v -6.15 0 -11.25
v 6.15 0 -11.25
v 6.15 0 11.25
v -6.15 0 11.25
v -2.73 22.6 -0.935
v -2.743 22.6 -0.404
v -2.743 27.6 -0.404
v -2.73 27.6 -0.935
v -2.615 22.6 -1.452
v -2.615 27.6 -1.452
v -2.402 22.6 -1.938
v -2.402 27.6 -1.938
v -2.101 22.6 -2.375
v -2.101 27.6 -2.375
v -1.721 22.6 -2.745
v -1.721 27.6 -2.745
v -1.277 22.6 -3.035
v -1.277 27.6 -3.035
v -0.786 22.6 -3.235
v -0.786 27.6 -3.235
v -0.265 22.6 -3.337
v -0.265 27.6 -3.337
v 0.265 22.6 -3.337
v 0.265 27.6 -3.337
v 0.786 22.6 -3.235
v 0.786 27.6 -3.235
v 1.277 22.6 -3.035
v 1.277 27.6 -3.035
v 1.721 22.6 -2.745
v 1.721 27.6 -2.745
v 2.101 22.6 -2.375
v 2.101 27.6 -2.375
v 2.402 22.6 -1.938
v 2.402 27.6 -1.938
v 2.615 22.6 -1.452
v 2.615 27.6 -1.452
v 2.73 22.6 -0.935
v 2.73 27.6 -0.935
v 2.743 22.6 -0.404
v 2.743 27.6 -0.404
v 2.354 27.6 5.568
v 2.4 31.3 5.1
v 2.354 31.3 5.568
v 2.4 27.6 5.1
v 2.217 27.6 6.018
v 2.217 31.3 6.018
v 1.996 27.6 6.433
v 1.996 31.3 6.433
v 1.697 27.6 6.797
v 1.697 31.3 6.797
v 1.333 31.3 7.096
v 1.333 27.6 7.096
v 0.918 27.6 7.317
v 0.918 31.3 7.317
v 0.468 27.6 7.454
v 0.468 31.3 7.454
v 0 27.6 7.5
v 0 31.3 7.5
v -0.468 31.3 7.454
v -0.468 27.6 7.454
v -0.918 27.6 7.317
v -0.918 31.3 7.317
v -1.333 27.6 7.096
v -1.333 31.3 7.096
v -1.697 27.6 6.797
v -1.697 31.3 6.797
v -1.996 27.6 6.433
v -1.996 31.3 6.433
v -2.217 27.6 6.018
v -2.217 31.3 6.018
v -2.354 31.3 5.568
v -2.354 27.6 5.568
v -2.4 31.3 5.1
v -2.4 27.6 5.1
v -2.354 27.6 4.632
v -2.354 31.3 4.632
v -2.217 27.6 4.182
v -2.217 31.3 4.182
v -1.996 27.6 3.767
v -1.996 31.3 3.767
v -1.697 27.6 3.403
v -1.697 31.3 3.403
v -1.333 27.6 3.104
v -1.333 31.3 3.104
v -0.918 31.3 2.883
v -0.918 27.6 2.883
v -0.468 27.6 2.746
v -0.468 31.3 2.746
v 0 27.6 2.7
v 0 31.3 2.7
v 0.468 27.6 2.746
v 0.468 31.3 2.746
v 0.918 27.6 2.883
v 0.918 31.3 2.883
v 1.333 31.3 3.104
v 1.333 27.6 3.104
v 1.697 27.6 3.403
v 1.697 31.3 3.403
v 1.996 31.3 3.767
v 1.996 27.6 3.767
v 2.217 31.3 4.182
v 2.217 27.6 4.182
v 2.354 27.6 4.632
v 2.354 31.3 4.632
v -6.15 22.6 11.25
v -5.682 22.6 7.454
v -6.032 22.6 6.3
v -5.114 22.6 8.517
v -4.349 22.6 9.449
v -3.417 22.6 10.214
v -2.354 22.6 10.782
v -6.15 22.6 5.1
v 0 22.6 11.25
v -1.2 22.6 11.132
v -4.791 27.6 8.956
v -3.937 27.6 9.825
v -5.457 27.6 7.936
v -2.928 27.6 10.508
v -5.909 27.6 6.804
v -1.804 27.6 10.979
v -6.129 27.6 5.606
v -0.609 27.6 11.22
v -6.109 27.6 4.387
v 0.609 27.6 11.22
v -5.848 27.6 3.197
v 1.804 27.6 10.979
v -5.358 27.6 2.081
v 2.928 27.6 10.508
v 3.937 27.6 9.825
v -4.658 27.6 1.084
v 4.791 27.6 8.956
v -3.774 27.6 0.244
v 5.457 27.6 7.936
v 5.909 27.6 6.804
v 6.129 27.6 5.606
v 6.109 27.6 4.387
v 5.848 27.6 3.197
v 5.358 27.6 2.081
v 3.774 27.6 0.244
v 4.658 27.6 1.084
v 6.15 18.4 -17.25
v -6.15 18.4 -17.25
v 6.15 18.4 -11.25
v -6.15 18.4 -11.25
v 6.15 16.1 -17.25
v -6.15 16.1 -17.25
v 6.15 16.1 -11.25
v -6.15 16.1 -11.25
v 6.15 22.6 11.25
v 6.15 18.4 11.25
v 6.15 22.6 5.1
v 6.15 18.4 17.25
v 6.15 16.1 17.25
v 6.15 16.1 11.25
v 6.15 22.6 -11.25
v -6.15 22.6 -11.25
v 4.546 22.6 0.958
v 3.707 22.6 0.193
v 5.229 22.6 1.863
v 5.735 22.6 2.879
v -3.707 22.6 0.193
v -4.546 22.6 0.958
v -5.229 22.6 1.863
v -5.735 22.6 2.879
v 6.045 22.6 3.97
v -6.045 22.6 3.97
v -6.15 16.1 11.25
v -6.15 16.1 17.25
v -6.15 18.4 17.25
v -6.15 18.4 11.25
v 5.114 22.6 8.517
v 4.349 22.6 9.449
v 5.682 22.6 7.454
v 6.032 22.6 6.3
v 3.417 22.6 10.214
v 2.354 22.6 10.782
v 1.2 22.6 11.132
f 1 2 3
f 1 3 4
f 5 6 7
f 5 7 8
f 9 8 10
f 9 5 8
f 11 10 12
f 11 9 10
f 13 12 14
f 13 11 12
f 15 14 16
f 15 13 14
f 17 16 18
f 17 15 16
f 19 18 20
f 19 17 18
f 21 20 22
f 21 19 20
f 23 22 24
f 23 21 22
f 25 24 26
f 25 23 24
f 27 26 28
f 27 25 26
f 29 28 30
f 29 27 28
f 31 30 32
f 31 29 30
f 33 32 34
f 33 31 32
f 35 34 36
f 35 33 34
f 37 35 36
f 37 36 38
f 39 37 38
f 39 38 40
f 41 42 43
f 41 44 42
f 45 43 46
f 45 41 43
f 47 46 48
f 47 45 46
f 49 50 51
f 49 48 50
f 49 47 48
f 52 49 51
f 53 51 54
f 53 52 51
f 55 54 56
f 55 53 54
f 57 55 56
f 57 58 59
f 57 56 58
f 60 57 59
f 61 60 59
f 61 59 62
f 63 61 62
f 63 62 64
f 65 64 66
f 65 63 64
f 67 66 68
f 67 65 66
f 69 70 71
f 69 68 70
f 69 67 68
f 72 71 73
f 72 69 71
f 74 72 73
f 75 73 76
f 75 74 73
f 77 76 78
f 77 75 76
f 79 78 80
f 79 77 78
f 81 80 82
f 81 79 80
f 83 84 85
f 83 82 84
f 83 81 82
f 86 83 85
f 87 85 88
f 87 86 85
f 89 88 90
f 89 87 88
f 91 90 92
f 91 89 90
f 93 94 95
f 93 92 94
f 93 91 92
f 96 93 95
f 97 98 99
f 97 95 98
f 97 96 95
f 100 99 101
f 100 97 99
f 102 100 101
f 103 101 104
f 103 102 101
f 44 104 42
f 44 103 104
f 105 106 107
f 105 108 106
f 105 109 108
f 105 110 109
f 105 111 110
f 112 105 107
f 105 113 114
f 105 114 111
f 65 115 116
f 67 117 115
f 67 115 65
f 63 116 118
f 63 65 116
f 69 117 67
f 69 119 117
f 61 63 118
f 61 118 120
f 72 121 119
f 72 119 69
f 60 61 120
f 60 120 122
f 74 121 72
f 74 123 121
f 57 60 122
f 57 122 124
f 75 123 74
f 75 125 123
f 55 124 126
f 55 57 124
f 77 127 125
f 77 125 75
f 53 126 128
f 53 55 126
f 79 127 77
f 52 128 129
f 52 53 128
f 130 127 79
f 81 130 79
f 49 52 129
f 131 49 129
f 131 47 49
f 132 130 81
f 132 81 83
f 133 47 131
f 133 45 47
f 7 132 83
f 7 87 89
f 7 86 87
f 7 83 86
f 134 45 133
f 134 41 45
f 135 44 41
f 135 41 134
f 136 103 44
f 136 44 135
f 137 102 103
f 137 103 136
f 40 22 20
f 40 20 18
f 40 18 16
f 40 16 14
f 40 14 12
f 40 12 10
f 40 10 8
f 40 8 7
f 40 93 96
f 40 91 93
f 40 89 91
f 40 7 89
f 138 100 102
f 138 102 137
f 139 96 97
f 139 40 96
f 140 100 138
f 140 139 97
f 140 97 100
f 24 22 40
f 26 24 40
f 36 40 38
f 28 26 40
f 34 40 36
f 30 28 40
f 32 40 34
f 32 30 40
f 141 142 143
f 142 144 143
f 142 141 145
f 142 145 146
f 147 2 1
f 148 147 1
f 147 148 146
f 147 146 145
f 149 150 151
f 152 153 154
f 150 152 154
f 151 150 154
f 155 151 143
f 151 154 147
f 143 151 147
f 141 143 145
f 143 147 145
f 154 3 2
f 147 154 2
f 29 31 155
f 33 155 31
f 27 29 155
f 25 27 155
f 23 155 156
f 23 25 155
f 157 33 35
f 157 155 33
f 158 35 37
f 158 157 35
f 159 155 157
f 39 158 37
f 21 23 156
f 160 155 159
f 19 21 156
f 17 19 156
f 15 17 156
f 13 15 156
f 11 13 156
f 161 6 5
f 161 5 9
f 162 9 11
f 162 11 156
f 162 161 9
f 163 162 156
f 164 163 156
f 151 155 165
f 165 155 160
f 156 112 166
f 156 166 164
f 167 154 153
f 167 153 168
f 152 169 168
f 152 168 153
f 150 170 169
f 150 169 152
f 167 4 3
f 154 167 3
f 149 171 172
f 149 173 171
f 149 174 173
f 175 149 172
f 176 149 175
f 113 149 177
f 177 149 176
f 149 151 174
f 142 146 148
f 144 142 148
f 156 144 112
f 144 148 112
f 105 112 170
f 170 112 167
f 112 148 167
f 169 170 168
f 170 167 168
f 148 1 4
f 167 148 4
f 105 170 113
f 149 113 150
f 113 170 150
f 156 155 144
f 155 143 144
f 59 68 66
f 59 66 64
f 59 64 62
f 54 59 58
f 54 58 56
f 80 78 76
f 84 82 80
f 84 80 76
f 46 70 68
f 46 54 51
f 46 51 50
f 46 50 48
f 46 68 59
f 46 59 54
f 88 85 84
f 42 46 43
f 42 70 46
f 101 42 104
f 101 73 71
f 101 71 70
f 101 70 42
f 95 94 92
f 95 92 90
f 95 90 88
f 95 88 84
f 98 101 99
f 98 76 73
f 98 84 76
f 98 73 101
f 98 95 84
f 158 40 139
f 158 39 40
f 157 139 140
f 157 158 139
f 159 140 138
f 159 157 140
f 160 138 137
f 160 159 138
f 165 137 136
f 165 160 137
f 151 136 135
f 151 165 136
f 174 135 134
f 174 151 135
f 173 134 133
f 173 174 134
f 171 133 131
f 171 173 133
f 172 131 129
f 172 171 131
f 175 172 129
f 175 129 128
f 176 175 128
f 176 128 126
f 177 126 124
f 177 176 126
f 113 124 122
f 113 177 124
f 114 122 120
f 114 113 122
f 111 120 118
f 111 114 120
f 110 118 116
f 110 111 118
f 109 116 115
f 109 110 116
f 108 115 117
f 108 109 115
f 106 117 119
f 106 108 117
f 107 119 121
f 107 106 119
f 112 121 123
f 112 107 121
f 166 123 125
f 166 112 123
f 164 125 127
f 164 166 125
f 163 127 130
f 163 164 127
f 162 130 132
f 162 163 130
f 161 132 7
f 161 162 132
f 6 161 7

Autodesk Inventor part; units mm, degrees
ref_plane "YZ Plane" through (0, 0, 0) normal (1, 0, 0) x (0, 1, 0)
ref_plane "XZ Plane" through (0, 0, 0) normal (0, 1, 0) x (-1, 0, 0)
ref_plane "XY Plane" through (0, 0, 0) normal (0, 0, 1) x (1, 0, 0)
sketch "Esquisse1" plane through (0, 0, 0) normal (0, 1, 0) x (-1, 0, 0)
  line L0 (6.15, 11.25) -> (-6.15, 11.25)
  line L1 (-6.15, 11.25) -> (-6.15, -11.25)
  line L2 (-6.15, -11.25) -> (6.15, -11.25)
  line L3 (6.15, -11.25) -> (6.15, 11.25)
  line L4 (6.15, 11.25) -> (-6.15, -11.25)
  line L5 (-6.15, 11.25) -> (6.15, -11.25)
  point P0 (0, 0)
  point P1 (0, 0)
  point P2 (0, 0)
  dimension "d0" = 22.5
  dimension "d1" = 12.3
extrude "Extrusion1" add sketch "Esquisse1" along normal blind 22.6
sketch "Esquisse2" plane through (-6.15, 0, 11.25) normal (0, 0, 1) x (1, 0, 0)
  line L0 (0, 0) -> (0, 22.6) projected
  line L1 (12.3, 0) -> (12.3, 22.6) projected
  line L2 (0, 18.4) -> (12.3, 18.4)
  line L3 (12.3, 18.4) -> (12.3, 16.1)
  line L4 (12.3, 16.1) -> (0, 16.1)
  line L5 (0, 16.1) -> (0, 18.4)
  line L6 (0, 0) -> (12.3, 0) projected
  point P0 (6.15, 0)
  point P1 (0, 16.1)
  dimension "d4" = 2.3
  dimension "d5" = 16.1
extrude "Extrusion2" add sketch "Esquisse2" along normal blind 6 contours L0 L2 L1 L4
sketch "Esquisse3" plane through (6.15, 0, -11.25) normal (0, 0, -1) x (-1, 0, 0)
  line L0 (12.3, 18.4) -> (0, 18.4) projected
  line L1 (12.3, 0) -> (12.3, 16.1) projected
  line L2 (0, 18.4) -> (12.3, 18.4)
  line L3 (12.3, 18.4) -> (12.3, 16.1)
  line L4 (12.3, 16.1) -> (0, 16.1)
  line L5 (0, 16.1) -> (0, 18.4)
  point P0 (6.15, 0)
extrude "Extrusion3" add sketch "Esquisse3" along normal blind 6
sketch "Esquisse4" plane through (0, 22.6, 0) normal (0, 1, 0) x (1, 0, 0)
  circle A0 centre (0, -5.1) radius 6.15
  line L0 (-6.15, 11.25) -> (-6.15, -11.25) projected
  line L1 (-6.15, -11.25) -> (6.15, -11.25) projected
  circle A1 centre (0, 0.6) radius 2.75
  point P0 (0, 0)
  point P1 (-2.743, 0.4044)
  point P2 (2.743, 0.4044)
  dimension "d10" = 12.3
  dimension "d11" = 6.15
  dimension "d12" = 5.5
  dimension "d13" = 14.6
extrude "Extrusion4" add sketch "Esquisse4" along normal blind 5 contours A0 A1 | A1 A0 | A0 A1
sketch "Esquisse5" plane through (0, 27.6, 0) normal (0, 1, 0) x (1, 0, 0)
  arc A0 (-6.15, -5.1) -> (0, -11.25) centre (0, -5.1) ccw projected
  circle A1 centre (0, -5.1) radius 2.4
  point P0 (0, 0)
  dimension "d16" = 4.8
extrude "Extrusion5" add sketch "Esquisse5" along normal blind 3.7
properties part number "servomoteur"
